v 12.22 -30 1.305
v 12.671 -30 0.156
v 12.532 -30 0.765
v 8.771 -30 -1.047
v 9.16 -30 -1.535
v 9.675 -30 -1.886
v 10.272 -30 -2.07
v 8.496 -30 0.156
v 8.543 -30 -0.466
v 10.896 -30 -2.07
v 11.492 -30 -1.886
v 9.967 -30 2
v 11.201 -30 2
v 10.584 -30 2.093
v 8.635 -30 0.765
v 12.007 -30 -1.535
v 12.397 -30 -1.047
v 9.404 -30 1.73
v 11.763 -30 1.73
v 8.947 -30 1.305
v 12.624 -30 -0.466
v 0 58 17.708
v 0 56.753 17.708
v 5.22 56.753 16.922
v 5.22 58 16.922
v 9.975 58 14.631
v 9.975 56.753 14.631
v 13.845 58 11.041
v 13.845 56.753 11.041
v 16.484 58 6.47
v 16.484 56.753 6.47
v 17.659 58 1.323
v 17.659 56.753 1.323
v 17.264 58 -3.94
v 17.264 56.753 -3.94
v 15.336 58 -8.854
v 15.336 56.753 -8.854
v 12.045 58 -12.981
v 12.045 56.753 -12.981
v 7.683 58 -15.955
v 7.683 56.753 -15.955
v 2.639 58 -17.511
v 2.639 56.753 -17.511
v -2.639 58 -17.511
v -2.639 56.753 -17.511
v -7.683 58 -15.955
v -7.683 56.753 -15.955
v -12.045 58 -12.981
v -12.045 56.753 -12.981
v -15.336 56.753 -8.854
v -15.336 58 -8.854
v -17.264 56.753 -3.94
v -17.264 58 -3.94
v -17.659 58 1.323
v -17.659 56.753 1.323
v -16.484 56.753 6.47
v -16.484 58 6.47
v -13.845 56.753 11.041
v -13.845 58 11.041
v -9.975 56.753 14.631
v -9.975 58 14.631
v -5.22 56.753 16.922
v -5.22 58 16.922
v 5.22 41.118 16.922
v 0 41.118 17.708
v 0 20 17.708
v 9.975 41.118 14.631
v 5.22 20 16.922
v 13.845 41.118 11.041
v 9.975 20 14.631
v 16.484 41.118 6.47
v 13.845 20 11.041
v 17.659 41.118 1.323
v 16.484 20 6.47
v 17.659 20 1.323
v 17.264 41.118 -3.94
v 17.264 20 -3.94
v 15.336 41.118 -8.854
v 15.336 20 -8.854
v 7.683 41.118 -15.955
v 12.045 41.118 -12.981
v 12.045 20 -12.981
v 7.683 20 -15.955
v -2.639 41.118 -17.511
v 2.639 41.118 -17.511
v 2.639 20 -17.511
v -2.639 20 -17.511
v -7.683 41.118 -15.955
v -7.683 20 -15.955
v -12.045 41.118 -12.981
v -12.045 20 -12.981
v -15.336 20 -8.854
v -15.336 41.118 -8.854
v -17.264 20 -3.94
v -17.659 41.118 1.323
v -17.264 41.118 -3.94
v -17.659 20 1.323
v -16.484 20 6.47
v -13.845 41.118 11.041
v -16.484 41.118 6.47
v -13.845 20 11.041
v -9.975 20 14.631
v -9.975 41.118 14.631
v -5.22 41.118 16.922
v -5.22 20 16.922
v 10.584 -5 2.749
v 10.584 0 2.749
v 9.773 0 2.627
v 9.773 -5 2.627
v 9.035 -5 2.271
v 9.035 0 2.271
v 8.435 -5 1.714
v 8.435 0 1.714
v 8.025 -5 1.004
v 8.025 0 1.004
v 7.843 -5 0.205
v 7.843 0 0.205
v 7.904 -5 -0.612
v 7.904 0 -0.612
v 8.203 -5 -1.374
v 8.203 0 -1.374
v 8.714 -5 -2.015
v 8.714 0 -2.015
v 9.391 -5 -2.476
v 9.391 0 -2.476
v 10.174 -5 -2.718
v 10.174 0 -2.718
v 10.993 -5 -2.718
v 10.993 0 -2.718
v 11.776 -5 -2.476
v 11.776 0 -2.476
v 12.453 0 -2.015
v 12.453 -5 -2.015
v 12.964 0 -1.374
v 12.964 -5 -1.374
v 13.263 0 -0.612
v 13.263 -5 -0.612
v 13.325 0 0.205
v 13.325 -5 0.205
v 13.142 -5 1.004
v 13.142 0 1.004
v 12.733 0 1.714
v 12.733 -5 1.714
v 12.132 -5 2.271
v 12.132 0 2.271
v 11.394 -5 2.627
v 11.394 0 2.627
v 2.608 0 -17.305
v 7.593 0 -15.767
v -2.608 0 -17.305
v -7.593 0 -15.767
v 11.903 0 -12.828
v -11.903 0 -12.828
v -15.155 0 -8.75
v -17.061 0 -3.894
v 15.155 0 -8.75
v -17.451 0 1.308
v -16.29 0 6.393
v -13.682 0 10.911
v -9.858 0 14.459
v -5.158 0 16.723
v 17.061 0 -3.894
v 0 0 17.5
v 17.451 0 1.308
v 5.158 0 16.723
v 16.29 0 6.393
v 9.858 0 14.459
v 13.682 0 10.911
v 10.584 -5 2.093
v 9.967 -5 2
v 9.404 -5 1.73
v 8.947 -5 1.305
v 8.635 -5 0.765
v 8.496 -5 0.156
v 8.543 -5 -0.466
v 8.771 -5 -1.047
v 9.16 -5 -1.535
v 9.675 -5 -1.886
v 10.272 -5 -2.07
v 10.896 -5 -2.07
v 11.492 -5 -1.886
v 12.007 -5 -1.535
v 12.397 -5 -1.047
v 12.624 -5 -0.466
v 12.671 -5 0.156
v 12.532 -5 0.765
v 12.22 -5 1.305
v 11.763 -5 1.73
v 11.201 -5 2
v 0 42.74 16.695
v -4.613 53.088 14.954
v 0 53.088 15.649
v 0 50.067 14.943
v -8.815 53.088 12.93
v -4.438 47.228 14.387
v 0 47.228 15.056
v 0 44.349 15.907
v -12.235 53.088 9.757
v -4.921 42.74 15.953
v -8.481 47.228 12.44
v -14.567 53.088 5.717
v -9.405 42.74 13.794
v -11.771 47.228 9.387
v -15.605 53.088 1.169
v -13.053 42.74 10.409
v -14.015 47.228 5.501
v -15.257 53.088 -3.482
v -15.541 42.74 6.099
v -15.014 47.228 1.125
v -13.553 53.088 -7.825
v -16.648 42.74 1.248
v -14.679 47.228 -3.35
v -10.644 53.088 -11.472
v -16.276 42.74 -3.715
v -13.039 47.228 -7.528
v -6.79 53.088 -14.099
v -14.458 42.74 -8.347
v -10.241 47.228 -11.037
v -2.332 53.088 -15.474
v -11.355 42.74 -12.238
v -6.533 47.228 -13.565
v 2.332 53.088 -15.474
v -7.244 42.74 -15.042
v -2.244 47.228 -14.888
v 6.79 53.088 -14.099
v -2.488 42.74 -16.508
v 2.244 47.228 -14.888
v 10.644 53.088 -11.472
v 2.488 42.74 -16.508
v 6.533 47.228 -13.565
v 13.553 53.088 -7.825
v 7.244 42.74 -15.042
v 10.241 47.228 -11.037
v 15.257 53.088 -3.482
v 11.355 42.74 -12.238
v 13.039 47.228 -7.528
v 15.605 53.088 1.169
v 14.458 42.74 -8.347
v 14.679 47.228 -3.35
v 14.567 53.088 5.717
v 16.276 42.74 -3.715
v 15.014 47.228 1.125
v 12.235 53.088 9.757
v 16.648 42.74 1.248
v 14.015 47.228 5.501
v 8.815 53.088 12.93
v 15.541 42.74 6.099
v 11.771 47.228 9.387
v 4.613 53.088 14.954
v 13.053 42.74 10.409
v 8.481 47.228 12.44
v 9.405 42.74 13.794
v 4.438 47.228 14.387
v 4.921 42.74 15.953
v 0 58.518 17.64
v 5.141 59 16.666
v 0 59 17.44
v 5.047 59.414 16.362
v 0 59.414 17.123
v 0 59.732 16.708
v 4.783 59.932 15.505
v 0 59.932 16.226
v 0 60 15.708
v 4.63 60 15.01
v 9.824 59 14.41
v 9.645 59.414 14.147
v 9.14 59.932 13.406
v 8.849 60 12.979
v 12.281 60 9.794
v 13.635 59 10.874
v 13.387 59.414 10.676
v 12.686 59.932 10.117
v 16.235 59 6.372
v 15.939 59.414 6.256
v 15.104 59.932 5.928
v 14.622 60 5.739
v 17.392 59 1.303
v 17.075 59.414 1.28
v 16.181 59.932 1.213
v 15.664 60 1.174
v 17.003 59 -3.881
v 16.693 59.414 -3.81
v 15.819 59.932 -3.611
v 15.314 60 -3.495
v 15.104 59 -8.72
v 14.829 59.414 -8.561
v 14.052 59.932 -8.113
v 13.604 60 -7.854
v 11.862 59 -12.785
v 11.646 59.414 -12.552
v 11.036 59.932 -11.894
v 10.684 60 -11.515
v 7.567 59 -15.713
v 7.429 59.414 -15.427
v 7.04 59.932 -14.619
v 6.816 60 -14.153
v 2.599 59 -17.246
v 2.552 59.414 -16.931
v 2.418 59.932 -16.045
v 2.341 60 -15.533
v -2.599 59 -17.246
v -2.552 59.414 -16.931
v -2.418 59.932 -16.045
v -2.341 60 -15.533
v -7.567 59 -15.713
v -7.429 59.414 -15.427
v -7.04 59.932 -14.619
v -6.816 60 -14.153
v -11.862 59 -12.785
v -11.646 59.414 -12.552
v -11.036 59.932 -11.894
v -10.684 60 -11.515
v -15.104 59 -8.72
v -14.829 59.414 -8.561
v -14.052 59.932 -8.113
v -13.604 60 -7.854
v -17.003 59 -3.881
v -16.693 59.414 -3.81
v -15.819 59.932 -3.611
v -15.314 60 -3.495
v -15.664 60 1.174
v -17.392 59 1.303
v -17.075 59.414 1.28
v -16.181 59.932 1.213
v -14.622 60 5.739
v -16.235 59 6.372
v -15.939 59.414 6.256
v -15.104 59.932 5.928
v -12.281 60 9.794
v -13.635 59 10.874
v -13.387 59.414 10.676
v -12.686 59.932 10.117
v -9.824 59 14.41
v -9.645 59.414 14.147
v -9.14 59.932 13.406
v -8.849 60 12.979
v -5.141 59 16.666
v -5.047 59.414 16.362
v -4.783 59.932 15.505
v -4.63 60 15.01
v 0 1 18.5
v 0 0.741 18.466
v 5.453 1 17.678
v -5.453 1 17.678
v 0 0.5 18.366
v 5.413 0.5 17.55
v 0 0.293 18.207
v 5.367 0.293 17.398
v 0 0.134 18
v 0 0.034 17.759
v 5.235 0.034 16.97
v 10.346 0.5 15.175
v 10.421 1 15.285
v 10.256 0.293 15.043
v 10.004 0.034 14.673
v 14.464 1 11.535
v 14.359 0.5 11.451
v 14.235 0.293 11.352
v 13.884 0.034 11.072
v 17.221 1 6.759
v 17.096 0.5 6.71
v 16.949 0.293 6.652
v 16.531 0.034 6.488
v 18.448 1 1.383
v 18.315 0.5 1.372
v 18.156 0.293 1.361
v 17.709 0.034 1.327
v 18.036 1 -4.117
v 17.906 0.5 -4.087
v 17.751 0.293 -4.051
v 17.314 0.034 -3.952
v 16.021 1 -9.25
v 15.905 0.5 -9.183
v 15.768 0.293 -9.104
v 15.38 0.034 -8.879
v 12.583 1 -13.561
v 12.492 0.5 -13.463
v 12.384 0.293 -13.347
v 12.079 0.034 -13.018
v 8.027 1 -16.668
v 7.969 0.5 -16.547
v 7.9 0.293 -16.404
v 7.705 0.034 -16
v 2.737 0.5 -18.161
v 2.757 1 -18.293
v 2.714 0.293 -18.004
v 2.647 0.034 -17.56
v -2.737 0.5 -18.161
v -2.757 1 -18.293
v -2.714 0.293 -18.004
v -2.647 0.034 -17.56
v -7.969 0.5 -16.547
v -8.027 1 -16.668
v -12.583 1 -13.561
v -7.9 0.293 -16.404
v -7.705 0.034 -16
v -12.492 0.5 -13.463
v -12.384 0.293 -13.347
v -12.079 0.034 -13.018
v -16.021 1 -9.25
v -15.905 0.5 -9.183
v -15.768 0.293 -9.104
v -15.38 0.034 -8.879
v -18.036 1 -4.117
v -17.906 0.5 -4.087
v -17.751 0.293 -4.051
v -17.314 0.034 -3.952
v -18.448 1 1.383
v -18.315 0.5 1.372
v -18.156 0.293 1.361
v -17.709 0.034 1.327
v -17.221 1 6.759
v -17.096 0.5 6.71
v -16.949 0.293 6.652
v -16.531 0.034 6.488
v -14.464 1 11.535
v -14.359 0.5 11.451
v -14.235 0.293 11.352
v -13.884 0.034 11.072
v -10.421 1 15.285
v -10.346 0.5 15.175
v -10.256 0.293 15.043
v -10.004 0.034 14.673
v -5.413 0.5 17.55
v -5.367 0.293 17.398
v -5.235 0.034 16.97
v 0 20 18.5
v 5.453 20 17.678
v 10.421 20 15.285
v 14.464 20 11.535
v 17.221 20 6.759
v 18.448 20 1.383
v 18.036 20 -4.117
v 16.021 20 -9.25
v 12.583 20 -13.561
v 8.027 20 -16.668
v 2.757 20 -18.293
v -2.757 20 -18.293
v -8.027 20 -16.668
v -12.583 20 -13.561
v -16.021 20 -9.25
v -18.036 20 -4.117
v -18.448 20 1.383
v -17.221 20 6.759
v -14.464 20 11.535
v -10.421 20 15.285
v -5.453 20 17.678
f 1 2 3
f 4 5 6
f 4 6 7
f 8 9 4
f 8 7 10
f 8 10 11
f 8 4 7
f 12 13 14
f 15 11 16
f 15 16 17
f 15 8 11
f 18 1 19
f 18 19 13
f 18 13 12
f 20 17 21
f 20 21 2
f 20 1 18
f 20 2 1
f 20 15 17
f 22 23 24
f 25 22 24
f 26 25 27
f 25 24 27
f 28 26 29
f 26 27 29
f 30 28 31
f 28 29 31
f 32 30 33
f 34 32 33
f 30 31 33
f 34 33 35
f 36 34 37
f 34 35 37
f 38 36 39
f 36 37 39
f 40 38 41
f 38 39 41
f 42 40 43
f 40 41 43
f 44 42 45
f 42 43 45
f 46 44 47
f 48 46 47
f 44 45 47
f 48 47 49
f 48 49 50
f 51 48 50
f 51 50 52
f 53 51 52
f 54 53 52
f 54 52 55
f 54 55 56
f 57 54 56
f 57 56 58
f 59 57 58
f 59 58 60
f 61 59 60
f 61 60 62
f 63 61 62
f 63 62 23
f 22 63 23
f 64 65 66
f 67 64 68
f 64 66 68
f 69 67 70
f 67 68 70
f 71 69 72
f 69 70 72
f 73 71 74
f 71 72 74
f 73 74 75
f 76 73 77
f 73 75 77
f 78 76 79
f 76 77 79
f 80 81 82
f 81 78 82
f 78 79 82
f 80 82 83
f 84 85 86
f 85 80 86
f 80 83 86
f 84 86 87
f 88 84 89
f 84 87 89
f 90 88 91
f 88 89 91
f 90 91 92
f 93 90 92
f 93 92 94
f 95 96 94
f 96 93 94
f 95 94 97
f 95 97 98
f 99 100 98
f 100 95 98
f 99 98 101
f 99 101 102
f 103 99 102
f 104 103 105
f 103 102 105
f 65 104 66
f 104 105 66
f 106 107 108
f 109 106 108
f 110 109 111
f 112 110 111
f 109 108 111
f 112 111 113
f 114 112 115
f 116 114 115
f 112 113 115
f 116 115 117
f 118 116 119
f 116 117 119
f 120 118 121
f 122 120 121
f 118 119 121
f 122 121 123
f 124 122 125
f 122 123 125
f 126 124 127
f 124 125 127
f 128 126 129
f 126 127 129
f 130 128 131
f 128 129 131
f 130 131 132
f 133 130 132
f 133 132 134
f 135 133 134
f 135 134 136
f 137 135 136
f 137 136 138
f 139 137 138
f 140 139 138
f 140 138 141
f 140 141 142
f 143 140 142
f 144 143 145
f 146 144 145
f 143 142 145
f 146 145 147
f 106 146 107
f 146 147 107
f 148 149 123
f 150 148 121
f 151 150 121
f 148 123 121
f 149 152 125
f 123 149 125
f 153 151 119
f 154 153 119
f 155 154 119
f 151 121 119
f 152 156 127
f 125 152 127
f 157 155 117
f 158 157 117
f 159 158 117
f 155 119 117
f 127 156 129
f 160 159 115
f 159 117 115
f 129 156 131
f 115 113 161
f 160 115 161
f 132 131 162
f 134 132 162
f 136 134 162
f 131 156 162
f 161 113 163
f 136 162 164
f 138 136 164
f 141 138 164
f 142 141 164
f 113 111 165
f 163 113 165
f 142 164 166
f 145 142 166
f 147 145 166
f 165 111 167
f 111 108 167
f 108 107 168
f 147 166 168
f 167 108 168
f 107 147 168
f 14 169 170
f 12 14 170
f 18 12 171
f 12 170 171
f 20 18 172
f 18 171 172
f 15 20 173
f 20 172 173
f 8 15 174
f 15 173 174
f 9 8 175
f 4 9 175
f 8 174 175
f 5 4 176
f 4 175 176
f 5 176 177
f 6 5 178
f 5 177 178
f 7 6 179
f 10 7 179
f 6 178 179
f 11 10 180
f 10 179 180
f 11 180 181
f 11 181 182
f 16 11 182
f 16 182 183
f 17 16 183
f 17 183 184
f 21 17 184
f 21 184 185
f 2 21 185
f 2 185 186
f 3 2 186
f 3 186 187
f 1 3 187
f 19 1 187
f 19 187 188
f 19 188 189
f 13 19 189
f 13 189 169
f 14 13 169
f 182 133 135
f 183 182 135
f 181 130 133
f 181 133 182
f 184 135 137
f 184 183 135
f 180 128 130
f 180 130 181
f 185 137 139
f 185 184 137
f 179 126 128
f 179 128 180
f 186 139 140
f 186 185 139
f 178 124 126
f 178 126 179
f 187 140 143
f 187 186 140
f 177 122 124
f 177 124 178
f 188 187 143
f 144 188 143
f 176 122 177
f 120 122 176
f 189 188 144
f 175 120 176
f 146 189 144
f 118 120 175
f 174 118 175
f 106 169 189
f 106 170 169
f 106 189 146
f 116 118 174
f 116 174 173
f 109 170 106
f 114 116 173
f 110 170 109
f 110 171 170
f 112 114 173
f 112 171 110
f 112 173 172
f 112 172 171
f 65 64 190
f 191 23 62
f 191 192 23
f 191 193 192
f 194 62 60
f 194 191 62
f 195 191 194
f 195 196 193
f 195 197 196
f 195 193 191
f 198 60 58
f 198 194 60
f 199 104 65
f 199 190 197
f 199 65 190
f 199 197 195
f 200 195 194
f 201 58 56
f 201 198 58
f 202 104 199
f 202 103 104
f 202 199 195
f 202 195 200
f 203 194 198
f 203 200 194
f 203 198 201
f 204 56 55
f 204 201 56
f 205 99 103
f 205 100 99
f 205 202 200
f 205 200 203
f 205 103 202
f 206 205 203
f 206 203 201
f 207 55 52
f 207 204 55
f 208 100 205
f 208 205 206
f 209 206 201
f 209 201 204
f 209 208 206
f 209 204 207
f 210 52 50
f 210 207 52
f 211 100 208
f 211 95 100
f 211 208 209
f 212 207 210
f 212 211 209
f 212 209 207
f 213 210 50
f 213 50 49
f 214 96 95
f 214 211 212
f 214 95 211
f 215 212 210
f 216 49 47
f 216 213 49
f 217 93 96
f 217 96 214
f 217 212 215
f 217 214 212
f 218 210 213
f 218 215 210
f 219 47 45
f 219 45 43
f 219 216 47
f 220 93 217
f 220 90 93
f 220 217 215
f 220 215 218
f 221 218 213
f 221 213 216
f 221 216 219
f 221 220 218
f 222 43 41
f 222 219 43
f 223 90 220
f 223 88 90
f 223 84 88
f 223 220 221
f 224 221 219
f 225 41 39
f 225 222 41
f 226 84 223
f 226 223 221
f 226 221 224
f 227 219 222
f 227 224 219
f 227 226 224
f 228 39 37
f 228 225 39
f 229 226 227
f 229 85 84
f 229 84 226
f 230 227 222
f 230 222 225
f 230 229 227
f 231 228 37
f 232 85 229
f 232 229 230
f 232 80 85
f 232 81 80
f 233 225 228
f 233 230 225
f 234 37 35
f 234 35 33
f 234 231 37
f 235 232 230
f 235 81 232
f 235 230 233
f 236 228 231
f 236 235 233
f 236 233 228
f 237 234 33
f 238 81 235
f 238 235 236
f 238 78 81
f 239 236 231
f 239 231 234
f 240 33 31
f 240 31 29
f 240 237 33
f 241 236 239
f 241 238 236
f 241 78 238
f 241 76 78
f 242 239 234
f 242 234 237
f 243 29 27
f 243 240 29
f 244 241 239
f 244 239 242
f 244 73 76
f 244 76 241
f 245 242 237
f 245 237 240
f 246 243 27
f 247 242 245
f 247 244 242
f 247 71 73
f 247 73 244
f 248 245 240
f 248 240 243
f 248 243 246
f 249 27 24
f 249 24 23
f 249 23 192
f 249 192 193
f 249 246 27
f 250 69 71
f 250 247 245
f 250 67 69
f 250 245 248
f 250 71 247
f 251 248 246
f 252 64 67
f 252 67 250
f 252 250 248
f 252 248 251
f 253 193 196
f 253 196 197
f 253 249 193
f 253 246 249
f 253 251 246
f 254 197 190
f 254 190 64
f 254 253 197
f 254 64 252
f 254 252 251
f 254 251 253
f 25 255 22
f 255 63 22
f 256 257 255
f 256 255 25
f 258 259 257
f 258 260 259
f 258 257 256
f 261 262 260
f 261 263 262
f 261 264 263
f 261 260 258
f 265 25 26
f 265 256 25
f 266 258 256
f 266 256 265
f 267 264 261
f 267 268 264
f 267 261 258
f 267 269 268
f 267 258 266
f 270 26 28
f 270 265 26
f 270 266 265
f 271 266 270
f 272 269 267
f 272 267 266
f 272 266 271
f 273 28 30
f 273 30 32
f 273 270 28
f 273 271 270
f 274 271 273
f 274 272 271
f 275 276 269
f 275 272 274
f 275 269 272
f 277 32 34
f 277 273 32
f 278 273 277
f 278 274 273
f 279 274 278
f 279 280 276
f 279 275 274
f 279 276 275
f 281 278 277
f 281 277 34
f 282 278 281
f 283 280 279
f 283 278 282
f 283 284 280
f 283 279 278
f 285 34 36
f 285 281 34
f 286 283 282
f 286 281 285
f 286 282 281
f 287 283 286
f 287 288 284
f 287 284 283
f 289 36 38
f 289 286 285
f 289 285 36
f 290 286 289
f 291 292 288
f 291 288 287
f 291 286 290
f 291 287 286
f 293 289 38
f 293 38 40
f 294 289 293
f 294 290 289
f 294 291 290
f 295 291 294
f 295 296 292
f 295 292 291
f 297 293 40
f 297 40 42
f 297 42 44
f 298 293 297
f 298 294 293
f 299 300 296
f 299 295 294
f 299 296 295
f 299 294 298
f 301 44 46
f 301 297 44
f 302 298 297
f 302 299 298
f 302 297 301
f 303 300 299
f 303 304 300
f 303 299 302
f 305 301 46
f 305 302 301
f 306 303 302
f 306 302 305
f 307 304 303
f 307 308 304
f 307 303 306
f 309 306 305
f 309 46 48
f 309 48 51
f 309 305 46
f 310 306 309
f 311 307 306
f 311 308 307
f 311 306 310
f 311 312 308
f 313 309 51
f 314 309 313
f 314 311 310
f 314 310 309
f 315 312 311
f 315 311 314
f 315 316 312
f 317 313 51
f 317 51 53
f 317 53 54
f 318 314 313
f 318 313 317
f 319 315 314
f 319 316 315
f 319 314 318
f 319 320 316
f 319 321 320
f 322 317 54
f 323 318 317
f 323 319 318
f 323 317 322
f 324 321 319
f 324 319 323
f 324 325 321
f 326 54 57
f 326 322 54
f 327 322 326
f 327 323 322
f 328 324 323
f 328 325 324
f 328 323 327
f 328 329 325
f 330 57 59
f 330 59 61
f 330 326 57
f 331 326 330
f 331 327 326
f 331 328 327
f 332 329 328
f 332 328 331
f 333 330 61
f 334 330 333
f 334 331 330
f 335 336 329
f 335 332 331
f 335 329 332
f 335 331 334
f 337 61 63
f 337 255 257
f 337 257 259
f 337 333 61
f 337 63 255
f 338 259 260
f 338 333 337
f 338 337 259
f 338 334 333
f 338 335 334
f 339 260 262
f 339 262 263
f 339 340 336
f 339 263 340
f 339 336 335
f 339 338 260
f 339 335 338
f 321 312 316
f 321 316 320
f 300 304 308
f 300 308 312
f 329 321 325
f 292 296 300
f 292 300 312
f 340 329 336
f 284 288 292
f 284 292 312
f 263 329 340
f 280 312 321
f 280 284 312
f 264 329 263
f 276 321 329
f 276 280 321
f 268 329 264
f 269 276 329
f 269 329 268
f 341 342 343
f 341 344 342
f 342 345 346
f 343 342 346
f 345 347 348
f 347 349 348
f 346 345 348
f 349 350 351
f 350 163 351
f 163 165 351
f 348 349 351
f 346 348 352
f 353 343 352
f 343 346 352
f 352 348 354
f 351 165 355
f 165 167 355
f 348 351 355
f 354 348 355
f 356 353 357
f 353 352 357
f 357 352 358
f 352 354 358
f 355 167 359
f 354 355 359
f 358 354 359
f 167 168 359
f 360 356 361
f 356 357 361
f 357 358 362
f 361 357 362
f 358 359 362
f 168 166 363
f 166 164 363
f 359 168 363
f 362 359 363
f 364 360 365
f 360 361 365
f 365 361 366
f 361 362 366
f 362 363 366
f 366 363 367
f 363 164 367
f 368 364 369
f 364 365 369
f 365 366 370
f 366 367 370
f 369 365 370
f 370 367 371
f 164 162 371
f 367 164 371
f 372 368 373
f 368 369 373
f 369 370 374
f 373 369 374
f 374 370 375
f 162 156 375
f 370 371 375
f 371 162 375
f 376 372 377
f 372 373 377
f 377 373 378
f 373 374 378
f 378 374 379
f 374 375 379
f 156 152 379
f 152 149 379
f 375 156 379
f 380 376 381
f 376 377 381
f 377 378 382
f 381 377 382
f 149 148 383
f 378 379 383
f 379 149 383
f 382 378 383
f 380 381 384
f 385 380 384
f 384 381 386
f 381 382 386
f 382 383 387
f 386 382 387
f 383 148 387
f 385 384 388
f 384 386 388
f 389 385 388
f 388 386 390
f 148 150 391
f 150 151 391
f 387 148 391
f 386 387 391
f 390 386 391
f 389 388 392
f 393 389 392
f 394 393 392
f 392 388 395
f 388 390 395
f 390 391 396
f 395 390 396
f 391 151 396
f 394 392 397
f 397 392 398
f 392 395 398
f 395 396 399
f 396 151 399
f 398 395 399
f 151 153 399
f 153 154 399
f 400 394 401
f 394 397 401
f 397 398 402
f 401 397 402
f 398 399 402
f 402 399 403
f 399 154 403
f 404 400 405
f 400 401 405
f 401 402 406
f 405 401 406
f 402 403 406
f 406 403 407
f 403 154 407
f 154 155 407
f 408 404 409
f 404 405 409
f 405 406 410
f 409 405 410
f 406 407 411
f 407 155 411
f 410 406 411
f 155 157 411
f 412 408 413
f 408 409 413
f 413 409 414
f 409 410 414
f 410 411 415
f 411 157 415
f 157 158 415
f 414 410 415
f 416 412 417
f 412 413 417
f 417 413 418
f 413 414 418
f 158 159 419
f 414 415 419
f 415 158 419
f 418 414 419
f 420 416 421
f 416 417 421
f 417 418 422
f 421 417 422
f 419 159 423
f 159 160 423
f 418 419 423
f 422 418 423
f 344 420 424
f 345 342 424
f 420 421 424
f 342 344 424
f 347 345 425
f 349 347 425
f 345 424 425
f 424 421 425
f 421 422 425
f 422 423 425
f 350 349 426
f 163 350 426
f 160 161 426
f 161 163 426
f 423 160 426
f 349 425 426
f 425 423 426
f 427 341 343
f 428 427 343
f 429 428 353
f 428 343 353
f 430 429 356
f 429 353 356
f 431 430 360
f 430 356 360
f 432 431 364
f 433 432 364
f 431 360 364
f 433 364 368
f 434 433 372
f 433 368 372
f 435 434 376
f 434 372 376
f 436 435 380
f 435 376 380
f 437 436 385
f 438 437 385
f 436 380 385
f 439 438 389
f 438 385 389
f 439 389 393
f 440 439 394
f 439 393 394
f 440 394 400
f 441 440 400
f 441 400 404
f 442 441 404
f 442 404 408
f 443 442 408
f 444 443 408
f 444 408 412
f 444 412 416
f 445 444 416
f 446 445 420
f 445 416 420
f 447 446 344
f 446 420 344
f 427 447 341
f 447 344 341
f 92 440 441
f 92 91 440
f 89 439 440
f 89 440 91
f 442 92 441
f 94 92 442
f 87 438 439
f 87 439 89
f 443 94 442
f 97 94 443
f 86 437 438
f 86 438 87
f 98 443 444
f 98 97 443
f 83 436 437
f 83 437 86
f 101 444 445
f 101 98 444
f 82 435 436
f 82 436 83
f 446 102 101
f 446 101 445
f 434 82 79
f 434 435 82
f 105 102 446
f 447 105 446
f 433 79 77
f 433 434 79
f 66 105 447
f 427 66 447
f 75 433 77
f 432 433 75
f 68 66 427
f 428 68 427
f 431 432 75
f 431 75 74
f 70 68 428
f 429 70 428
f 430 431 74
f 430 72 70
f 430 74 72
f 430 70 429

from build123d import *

# Parameters (mm, degrees)
SKETCH1_R           = 18.5
BOSS_EXTRUDE1_DEPTH = 20
SKETCH2_R           = 17.708290072
BOSS_EXTRUDE2_DEPTH = 40
SKETCH3_R           = 2.093314986
BOSS_EXTRUDE3_DEPTH = 30
FILLET1_R           = 2
FILLET2_R           = 1
SKETCH5_R           = 2.748707601
BOSS_EXTRUDE4_DEPTH = 5


with BuildPart() as part:
    # Sketch1 → Boss-Extrude1 (new body)
    with BuildSketch(Plane(origin=(0, 0, 0), x_dir=(1, 0, 0), z_dir=(0, 1, 0))):
        with Locations(Location((0, 0, 0), (0, 0, 270))):
            Circle(SKETCH1_R)
    extrude(amount=BOSS_EXTRUDE1_DEPTH)

    # Sketch2 → Boss-Extrude2 (add)
    with BuildSketch(Plane(origin=(0, 20, 0), x_dir=(1, 0, 0), z_dir=(0, 1, 0))):
        with Locations(Location((0, 0, 0), (0, 0, 270))):
            Circle(SKETCH2_R)
    extrude(amount=BOSS_EXTRUDE2_DEPTH)

    # Sketch3 → Boss-Extrude3 (add)
    with BuildSketch(Plane.XZ):
        with Locations(Location((10.583651539, 0, 0), (0, 0, 90))):
            Circle(SKETCH3_R)
    extrude(amount=BOSS_EXTRUDE3_DEPTH)

    # Sketch4 → Cut-Revolve1 (revolve, cut)
    with BuildSketch(Plane(origin=(0, 0, 0), x_dir=(0, 0, -1), z_dir=(1, 0, 0))):
        with BuildLine():
            add(Edge.make_bspline(
                [(-17.708290072, 56.753435872), (-12.088729605, 49.239761399), (-17.708290072, 41.11831897)],
                knots=[0, 0, 0, 1, 1, 1], degree=2))
            Line((-17.708290072, 41.11831897), (-17.708290072, 56.753435872))
        make_face()
    revolve(axis=Axis((0, 60, 0), (0, -1, 0)), mode=Mode.SUBTRACT)

    # Fillet1
    fillet1_edges = [part.edges().sort_by_distance(p)[0] for p in [
        (0, 60, -17.708290072),
    ]]
    fillet(fillet1_edges, radius=FILLET1_R)

    # Fillet2
    fillet2_edges = [part.edges().sort_by_distance(p)[0] for p in [
        (0, 0, -18.5),
    ]]
    fillet(fillet2_edges, radius=FILLET2_R)

    # Sketch5 → Boss-Extrude4 (add)
    with BuildSketch(Plane.XZ):
        with Locations(Location((10.583651539, 0, 0), (0, 0, 90))):
            Circle(SKETCH5_R)
    extrude(amount=BOSS_EXTRUDE4_DEPTH)


solid = part.part
